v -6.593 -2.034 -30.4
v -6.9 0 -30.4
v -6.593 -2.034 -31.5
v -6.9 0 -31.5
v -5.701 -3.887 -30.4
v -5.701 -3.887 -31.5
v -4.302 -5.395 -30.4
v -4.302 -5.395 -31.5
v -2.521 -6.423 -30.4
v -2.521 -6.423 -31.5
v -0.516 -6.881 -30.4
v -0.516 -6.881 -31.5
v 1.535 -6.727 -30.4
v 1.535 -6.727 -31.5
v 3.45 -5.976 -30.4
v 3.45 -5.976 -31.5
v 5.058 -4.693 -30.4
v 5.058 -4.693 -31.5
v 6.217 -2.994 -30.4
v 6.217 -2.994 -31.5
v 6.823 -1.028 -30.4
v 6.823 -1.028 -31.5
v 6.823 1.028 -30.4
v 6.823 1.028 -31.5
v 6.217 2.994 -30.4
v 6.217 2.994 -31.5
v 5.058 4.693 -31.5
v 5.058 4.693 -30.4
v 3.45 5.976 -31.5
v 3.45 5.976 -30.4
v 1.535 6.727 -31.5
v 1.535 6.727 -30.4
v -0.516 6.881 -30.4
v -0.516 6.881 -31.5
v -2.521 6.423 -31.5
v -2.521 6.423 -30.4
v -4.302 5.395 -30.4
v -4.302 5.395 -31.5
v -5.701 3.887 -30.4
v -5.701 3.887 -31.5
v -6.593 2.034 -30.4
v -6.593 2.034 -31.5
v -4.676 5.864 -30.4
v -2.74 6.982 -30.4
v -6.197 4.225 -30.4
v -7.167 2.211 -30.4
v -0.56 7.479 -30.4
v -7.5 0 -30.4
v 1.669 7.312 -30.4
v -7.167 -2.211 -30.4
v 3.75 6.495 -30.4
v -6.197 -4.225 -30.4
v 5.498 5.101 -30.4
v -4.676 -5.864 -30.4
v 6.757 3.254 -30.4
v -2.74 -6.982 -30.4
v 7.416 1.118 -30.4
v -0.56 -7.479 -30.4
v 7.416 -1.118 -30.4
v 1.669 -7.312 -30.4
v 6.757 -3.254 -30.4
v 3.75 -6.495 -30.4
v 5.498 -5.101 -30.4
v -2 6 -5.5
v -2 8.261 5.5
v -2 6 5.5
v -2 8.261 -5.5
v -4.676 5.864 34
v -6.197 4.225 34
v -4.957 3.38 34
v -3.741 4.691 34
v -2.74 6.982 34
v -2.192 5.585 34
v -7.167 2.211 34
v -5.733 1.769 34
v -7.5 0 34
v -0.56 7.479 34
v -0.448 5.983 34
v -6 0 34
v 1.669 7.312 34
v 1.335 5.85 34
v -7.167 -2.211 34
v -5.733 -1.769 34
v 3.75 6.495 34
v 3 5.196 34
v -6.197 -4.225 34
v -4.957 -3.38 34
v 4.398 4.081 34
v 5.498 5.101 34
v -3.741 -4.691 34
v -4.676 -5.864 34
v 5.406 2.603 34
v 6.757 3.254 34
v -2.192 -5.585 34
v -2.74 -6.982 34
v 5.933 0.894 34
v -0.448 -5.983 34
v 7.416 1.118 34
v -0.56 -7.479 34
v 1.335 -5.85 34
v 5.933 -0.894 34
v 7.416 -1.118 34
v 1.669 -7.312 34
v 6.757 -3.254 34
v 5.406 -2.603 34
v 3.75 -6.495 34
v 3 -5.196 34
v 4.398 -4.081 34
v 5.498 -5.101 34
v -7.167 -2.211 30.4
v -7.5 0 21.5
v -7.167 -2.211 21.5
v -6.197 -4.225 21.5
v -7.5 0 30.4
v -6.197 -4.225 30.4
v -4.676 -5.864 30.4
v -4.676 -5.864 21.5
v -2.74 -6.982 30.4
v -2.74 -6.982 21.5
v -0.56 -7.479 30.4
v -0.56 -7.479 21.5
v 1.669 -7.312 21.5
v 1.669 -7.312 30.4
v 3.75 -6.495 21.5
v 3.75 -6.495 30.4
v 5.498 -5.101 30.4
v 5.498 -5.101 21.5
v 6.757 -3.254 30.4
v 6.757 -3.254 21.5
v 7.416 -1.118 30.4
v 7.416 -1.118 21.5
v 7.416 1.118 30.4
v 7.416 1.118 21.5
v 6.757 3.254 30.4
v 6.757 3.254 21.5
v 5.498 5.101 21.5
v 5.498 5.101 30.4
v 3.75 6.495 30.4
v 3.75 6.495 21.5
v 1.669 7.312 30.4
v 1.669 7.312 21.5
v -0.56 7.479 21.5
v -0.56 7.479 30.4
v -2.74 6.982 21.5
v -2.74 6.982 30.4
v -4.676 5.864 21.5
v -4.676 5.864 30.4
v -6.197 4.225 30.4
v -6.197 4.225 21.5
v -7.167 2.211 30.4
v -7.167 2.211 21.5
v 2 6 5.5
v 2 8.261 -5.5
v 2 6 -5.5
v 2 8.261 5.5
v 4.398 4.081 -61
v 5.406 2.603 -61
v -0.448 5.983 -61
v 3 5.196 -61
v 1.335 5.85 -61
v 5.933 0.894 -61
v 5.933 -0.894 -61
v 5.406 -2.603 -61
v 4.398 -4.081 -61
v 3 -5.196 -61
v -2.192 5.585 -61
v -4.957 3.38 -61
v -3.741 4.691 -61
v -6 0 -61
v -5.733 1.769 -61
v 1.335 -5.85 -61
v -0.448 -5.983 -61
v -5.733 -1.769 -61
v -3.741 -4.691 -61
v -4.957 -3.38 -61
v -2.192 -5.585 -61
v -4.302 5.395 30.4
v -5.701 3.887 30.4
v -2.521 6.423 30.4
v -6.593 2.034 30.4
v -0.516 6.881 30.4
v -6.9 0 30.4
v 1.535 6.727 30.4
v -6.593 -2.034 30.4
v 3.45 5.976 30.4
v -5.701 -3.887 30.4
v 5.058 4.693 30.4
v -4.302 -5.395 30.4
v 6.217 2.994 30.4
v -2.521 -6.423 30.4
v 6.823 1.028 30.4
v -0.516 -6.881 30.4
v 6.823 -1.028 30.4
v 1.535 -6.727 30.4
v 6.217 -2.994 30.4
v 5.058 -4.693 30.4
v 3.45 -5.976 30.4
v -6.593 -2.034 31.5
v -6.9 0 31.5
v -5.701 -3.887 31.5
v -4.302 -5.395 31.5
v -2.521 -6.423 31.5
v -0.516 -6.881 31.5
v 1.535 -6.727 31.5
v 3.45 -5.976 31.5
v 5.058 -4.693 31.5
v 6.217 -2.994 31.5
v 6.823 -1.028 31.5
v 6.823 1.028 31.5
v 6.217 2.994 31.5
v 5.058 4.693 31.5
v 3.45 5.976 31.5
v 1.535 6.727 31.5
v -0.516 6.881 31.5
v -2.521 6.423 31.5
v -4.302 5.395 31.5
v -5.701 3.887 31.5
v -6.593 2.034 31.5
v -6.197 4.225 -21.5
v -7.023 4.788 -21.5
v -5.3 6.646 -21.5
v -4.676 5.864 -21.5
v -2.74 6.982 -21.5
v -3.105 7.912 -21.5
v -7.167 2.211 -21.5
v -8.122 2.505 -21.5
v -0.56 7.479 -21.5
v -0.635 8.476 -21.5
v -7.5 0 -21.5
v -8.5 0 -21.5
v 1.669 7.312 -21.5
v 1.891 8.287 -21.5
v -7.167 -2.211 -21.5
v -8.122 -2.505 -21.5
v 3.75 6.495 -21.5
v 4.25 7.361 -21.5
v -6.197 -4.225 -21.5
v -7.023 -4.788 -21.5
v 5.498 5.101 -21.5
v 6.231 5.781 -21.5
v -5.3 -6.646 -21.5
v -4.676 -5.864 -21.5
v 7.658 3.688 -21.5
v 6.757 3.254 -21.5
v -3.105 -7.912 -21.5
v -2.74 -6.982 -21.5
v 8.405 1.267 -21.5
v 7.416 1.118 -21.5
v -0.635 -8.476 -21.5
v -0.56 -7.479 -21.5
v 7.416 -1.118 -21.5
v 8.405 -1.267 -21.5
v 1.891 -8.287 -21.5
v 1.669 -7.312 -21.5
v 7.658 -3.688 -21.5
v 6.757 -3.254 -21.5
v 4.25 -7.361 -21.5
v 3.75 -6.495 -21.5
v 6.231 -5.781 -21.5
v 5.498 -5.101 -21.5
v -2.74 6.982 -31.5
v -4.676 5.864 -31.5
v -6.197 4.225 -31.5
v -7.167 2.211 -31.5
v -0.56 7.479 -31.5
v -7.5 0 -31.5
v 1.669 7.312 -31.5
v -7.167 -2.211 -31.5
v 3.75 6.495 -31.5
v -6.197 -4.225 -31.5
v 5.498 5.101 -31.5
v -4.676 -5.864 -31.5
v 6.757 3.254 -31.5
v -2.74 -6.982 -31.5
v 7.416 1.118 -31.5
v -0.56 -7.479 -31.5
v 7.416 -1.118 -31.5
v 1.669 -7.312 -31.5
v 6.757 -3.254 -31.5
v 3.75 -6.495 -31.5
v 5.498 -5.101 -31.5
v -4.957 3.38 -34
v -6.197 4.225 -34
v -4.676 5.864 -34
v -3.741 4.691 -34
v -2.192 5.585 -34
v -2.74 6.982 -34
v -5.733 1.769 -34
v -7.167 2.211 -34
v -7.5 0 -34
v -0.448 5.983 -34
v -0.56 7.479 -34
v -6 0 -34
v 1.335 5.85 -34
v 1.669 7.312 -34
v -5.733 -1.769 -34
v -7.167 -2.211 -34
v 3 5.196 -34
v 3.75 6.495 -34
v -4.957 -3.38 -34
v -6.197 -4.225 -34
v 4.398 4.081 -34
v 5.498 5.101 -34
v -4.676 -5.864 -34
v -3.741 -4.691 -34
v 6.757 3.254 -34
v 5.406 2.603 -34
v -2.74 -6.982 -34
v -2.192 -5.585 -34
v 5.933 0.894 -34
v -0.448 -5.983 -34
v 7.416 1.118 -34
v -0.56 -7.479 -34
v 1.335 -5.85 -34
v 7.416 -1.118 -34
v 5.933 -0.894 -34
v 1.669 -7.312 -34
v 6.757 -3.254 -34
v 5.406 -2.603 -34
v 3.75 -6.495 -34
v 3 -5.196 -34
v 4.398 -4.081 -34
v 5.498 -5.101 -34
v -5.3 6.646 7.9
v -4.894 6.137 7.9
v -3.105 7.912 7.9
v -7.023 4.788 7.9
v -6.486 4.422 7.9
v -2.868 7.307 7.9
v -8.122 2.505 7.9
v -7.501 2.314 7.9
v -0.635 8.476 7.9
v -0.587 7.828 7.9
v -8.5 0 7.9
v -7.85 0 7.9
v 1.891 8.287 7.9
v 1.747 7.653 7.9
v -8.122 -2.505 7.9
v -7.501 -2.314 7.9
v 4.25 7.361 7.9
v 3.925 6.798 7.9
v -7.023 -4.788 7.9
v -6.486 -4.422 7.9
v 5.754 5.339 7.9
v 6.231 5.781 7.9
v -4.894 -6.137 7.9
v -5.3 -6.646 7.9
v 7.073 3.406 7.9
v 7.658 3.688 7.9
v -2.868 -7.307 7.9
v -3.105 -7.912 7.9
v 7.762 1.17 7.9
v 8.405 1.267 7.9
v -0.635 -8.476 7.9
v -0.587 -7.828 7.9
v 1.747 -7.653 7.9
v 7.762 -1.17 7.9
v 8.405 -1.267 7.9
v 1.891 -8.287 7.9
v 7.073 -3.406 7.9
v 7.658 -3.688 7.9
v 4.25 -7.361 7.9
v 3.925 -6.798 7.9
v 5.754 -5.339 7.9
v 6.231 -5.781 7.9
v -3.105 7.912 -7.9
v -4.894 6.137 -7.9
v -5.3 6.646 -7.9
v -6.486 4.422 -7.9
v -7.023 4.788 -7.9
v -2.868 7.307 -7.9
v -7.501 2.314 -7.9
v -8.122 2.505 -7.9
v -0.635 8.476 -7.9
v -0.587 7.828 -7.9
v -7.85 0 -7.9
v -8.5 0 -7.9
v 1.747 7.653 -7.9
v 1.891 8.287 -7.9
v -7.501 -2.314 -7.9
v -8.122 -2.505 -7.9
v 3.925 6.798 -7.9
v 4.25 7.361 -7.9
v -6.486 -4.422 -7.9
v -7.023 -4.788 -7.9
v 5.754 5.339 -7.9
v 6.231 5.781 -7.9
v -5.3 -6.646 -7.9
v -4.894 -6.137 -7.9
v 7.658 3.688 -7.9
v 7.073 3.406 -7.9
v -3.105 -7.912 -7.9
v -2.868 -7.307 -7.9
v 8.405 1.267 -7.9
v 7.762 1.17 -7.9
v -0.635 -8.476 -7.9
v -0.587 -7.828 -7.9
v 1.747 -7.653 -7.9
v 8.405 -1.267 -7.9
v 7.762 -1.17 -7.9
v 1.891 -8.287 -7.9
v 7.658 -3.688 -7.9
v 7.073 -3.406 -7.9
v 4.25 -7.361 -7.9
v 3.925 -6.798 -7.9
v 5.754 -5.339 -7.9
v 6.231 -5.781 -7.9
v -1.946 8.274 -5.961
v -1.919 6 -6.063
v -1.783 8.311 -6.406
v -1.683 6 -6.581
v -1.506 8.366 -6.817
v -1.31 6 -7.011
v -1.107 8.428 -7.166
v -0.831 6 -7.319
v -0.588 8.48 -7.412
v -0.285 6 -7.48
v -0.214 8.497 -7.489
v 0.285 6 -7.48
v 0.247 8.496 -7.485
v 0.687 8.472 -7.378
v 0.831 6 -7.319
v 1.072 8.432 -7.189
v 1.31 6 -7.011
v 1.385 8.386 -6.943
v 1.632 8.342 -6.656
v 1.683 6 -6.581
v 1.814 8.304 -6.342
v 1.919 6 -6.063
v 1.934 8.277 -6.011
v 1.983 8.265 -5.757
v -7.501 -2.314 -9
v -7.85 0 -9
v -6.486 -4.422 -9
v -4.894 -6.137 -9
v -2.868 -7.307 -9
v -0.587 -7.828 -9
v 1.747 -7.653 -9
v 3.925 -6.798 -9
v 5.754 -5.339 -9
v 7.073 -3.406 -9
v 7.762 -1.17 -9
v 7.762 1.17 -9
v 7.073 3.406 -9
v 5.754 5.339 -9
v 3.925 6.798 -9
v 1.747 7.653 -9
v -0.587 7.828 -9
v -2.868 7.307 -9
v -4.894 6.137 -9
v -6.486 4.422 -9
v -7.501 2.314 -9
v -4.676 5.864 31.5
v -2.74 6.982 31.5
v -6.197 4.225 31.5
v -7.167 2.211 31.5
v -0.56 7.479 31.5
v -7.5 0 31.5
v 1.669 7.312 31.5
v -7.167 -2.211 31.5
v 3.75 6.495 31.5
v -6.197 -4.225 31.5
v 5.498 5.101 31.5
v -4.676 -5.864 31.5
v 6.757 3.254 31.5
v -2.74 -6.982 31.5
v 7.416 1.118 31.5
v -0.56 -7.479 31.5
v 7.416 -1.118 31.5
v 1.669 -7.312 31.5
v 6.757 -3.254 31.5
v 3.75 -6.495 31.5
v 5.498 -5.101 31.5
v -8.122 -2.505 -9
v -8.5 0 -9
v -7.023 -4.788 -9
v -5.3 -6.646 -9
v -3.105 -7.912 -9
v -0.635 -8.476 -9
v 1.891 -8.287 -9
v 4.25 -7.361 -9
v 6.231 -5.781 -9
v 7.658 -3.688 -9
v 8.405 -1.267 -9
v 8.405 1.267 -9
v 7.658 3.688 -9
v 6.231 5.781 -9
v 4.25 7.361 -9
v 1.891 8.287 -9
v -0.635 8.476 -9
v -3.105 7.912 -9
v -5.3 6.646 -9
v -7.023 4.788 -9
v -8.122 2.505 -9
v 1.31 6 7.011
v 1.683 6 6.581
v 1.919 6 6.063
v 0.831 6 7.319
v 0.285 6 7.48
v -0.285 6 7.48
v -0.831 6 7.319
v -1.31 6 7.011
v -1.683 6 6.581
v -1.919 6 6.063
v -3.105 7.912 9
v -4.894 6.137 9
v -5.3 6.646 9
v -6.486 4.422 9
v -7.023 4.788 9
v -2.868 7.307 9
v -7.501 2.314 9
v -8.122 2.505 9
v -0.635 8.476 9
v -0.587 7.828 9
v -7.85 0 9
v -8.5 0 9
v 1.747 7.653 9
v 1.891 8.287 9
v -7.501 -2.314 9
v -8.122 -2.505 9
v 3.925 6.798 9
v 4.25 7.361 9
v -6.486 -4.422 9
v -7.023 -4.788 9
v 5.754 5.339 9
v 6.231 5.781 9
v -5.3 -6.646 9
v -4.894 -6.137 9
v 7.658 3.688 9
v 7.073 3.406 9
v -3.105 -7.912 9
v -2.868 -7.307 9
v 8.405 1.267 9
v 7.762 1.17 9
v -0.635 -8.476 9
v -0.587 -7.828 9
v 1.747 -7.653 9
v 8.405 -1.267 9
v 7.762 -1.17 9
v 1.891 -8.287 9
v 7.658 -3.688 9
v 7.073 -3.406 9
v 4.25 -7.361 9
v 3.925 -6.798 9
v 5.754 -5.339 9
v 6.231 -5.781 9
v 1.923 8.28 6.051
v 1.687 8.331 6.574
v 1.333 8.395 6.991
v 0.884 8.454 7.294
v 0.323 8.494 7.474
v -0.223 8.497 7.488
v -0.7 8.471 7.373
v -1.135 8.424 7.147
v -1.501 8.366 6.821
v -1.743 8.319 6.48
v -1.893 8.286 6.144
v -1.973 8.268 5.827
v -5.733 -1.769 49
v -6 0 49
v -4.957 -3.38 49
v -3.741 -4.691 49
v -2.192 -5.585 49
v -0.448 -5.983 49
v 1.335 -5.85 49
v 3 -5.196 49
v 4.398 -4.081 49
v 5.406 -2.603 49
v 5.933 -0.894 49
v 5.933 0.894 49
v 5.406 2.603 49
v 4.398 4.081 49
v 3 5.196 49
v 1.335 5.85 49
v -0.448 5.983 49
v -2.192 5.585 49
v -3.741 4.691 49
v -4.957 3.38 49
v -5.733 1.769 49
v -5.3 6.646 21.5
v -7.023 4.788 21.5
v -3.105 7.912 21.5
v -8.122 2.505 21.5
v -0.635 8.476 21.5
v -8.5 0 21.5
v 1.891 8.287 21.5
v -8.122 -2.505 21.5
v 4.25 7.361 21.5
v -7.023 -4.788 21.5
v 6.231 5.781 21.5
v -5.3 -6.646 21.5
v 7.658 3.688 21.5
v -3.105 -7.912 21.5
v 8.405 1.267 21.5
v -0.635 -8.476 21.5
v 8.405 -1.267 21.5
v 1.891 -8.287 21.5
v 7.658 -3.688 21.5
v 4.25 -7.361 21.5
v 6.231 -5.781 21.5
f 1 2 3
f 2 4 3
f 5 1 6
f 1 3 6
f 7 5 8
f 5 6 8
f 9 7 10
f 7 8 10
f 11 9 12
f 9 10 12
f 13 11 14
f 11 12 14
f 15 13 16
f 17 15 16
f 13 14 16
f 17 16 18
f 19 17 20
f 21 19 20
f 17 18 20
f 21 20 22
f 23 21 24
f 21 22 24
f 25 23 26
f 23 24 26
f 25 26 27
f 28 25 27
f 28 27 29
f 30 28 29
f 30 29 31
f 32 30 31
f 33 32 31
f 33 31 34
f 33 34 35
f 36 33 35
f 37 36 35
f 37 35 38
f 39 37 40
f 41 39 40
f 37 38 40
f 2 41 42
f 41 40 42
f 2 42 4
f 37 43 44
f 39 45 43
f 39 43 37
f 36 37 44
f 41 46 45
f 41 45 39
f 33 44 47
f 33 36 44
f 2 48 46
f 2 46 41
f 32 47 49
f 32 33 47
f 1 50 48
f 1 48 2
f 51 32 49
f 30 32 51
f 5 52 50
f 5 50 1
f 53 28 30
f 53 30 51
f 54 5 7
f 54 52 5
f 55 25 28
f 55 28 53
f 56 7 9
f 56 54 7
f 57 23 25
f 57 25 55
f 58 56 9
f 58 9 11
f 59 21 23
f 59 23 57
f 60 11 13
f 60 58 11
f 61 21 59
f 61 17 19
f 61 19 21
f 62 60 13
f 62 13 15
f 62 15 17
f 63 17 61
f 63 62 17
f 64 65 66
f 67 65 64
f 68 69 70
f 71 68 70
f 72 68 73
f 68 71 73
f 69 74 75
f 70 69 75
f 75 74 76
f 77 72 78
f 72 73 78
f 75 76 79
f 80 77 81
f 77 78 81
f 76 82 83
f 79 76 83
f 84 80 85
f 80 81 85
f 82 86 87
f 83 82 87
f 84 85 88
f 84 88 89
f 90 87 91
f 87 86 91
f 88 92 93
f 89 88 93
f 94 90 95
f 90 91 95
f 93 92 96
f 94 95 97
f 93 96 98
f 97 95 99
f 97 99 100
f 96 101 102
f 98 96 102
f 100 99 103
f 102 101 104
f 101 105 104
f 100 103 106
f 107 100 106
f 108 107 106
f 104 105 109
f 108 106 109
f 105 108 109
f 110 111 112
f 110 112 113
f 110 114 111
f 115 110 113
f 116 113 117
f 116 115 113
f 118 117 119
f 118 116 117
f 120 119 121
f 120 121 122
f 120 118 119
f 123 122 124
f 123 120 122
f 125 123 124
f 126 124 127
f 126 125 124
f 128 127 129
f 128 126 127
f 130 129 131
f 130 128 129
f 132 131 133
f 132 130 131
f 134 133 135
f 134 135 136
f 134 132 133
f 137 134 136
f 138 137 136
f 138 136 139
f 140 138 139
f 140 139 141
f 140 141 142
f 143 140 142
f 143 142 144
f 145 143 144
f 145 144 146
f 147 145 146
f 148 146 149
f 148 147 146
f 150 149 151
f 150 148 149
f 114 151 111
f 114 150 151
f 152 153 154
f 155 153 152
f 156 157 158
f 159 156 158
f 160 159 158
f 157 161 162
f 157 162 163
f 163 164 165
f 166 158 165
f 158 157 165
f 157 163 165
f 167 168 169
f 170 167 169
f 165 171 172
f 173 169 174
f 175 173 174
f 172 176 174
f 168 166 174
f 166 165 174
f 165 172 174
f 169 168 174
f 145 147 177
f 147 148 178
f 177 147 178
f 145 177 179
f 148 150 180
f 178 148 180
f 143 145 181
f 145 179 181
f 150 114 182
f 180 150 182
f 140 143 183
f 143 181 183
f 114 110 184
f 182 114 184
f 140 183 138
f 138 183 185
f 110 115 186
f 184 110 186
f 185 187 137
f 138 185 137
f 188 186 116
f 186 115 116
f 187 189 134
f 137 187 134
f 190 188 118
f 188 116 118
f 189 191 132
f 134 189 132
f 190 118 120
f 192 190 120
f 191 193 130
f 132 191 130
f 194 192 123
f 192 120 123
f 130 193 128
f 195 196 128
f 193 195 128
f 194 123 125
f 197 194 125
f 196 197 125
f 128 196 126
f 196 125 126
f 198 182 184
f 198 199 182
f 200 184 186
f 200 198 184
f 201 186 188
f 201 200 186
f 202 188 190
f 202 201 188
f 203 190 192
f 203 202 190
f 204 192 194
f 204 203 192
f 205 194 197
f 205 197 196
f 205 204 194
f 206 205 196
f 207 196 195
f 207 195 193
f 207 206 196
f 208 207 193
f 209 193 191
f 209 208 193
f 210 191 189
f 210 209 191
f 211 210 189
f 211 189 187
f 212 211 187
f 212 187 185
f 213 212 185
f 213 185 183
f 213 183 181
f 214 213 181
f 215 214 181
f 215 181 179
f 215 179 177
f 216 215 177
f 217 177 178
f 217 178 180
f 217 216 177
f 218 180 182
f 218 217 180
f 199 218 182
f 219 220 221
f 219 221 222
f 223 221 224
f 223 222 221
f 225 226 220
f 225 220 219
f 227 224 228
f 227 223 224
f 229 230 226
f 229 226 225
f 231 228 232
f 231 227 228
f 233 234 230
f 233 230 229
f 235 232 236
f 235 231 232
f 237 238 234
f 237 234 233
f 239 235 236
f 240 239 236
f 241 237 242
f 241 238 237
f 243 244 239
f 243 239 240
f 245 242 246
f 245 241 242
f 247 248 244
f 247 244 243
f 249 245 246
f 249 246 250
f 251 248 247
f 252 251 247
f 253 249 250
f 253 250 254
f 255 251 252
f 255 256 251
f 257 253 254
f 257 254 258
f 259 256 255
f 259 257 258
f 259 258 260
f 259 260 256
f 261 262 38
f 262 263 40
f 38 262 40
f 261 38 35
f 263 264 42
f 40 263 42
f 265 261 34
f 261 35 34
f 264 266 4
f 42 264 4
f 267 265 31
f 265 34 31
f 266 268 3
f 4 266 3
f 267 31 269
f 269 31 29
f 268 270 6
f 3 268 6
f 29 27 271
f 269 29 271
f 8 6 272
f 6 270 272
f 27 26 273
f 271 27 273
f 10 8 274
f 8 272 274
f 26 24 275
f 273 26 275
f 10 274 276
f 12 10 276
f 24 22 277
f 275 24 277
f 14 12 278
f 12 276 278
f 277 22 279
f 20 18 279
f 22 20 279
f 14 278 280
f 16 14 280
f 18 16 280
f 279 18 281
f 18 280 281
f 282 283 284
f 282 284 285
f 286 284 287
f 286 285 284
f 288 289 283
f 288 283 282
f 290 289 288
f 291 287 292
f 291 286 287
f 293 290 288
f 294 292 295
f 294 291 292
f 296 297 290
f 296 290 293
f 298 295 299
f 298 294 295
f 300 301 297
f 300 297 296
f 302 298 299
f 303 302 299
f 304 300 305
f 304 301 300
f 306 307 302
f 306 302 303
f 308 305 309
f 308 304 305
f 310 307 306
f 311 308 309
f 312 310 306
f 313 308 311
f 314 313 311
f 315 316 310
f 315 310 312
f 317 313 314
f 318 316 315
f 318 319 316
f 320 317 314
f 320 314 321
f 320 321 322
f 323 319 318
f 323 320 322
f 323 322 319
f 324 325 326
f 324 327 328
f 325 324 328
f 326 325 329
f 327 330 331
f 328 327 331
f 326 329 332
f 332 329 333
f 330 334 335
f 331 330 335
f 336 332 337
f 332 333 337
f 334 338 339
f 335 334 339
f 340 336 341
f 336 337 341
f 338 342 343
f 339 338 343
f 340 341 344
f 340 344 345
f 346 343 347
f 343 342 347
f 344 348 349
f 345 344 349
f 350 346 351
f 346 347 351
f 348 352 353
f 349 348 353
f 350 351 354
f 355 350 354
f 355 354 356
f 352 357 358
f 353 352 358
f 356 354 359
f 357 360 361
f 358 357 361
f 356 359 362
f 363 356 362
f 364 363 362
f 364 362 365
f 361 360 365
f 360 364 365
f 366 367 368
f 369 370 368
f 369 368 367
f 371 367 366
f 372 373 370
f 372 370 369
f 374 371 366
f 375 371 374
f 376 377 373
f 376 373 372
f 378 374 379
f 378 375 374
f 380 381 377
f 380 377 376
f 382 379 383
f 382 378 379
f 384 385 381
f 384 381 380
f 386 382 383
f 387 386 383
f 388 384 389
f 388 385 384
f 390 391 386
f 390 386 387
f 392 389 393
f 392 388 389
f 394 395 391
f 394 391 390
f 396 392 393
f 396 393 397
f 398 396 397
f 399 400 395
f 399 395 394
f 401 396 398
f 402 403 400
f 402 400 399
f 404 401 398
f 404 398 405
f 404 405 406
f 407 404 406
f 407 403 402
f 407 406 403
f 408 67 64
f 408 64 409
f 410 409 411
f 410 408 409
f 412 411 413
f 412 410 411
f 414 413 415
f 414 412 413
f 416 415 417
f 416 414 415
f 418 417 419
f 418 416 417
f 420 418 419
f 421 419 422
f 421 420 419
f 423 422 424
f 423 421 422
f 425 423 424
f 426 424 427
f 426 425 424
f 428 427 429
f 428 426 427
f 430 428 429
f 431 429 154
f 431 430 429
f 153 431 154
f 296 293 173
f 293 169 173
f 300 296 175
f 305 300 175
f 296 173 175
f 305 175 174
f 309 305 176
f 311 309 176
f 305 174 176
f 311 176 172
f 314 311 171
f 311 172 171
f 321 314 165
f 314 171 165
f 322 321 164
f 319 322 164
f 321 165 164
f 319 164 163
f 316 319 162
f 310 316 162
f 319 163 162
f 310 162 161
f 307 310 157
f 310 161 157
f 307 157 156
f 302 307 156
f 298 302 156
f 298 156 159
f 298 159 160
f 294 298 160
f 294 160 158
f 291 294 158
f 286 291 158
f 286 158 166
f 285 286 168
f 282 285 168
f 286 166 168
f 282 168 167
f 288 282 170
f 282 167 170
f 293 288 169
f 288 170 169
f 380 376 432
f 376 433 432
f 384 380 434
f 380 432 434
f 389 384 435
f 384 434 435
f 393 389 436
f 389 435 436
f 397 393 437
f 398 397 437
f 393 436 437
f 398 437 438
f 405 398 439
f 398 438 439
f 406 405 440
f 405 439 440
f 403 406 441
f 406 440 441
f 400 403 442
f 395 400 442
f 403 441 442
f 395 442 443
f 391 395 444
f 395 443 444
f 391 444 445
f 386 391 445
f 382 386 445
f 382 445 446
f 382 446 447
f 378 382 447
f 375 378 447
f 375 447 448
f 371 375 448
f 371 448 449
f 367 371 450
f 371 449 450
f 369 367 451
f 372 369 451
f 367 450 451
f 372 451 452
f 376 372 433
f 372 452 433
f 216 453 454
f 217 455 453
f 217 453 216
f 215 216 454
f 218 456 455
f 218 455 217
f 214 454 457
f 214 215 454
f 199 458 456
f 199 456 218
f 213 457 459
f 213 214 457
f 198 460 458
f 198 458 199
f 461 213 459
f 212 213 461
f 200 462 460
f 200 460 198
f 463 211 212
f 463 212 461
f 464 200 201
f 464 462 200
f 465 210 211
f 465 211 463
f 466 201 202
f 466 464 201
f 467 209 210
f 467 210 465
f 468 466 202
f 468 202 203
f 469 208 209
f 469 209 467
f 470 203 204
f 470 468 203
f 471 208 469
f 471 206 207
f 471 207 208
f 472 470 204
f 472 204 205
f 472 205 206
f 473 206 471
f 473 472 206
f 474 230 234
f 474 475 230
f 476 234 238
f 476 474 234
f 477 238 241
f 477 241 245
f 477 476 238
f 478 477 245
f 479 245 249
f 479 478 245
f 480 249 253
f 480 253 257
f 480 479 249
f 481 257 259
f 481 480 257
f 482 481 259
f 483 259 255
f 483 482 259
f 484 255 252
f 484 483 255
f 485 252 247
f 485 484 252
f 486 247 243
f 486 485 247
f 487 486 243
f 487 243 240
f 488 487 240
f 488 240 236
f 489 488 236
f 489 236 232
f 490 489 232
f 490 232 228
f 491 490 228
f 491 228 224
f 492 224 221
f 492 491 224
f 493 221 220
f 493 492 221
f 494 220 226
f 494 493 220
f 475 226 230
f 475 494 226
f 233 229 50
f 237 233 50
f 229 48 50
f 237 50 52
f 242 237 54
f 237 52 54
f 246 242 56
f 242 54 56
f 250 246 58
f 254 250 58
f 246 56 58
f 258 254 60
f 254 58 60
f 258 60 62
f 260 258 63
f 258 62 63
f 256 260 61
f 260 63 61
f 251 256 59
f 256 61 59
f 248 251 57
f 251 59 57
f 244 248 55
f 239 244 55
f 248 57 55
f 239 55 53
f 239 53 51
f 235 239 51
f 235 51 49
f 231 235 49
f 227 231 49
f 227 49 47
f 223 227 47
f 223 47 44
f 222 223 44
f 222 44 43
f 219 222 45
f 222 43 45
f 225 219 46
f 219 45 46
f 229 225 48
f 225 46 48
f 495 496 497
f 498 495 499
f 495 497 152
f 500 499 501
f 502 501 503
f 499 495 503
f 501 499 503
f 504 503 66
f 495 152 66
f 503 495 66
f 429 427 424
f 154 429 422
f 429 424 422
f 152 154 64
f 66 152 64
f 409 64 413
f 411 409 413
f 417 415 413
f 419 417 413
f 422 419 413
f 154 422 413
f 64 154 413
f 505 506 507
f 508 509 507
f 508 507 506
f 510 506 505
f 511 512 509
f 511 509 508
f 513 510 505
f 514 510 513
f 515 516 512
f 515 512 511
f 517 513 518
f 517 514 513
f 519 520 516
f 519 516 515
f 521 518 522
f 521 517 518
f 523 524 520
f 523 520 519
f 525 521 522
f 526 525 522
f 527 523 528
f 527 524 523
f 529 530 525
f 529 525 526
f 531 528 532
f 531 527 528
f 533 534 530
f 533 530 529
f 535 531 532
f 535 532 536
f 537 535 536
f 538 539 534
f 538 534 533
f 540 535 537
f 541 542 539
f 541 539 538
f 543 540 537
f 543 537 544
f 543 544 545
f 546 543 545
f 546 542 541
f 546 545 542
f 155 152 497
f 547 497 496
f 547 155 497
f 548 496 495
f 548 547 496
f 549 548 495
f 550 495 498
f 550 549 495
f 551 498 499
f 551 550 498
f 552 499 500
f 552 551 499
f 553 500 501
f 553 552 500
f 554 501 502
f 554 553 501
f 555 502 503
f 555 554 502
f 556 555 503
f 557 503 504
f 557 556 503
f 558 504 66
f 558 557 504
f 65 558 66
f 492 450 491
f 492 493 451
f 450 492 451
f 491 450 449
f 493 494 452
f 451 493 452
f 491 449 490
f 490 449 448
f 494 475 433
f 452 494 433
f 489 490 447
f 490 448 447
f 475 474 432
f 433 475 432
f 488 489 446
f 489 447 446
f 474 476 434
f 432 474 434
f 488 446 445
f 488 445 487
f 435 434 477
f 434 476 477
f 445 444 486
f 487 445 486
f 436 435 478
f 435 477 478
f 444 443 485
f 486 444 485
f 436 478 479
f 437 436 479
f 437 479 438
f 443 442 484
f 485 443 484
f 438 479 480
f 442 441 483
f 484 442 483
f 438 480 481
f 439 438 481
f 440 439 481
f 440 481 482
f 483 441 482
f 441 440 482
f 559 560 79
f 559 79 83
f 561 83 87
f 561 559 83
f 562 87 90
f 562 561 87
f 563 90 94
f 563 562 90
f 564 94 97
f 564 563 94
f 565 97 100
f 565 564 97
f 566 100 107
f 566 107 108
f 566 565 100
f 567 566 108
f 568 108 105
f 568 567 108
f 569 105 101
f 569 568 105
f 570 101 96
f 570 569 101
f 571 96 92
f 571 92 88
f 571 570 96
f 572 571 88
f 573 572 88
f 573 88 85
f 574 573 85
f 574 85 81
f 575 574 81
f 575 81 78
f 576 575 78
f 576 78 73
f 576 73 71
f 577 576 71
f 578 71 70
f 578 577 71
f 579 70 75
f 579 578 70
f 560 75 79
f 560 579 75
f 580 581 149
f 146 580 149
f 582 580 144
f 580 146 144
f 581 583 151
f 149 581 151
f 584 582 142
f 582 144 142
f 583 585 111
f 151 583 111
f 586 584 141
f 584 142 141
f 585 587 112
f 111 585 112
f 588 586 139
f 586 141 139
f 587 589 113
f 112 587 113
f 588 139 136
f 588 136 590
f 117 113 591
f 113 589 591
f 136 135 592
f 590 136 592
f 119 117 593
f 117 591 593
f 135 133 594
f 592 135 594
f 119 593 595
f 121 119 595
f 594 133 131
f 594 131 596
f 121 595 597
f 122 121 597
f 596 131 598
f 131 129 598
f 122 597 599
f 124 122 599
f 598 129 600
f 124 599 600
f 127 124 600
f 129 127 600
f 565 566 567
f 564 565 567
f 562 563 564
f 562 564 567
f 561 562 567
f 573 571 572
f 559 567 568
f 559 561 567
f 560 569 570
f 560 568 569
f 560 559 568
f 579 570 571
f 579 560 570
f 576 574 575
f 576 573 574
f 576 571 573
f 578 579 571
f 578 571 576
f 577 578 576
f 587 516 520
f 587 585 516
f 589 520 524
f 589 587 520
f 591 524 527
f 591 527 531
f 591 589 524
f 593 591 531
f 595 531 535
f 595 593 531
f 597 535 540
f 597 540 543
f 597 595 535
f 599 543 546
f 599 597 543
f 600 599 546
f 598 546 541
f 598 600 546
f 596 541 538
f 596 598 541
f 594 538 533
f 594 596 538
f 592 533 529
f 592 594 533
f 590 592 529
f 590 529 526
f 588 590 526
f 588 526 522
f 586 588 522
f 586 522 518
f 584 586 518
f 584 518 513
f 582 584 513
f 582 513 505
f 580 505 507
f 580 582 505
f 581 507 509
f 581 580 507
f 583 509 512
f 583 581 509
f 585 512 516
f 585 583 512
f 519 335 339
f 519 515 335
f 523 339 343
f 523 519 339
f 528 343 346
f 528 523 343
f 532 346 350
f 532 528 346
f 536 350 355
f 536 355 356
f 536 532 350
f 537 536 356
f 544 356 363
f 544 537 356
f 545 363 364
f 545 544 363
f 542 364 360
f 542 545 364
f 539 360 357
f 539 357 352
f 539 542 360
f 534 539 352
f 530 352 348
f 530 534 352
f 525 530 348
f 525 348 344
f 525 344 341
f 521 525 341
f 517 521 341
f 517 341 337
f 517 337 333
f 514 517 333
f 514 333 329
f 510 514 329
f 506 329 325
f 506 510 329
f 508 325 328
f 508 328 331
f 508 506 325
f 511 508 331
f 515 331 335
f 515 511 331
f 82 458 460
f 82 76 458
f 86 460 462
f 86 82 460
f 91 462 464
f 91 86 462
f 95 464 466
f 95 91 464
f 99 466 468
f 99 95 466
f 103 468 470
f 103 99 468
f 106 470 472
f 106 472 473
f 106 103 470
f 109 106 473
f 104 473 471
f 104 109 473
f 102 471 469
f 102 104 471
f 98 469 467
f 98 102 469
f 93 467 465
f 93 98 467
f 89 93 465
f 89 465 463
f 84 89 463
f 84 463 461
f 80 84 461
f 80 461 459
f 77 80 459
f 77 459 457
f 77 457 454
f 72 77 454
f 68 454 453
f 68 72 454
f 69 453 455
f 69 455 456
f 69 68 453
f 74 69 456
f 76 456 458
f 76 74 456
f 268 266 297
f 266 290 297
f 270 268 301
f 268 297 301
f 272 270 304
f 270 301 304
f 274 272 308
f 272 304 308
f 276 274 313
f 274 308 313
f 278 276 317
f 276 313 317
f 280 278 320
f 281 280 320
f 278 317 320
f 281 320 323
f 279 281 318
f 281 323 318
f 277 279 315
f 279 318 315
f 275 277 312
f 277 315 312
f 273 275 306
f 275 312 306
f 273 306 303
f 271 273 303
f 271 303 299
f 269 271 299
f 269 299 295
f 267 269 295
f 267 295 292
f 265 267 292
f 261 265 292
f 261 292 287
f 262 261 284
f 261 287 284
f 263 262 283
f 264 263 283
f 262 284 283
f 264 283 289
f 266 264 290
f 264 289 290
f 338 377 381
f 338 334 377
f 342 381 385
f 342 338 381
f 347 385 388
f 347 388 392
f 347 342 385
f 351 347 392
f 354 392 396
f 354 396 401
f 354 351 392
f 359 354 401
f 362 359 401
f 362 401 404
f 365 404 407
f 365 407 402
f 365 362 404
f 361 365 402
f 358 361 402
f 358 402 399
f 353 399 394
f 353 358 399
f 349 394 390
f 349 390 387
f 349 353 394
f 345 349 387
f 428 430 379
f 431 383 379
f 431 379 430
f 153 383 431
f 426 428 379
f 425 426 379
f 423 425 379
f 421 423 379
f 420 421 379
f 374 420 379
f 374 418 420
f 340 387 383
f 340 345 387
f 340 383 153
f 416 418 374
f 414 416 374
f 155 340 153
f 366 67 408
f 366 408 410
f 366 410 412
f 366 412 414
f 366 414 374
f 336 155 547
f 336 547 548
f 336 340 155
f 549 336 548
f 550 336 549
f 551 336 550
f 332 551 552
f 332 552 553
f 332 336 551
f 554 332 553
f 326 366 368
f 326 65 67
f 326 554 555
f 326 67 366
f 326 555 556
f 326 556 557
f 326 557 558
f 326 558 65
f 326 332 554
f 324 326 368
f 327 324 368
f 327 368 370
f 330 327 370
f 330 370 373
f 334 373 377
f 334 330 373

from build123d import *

# Parameters (mm, degrees)
SKETCH1_R               = 8.5
BOSS_EXTRUDE1_DEPTH     = 61
SKETCH2_W               = 39.5
SKETCH2_H               = 1
SKETCH3_W               = 27
SKETCH3_H               = 1.5
SKETCH4_W               = 1.1
SKETCH4_H               = 0.6
SKETCH5_W               = 1.1
SKETCH5_H               = 0.65
CUT_EXTRUDE1_DEPTH      = 63.173145328
CUT_EXTRUDE1_DEPTH_BACK = 63.173145328
SKETCH6_W               = 12
SKETCH6_H               = 12
CUT_EXTRUDE2_DEPTH      = 2.5


with BuildPart() as part:
    # Sketch1 → Boss-Extrude1 (new, symmetric)
    with BuildSketch(Plane.XY):
        with Locations(Location((0, 0, 0), (0, 0, 180))):
            Circle(SKETCH1_R)
    extrude(amount=BOSS_EXTRUDE1_DEPTH, both=True)

    # Sketch2 → Cut-Revolve1 (revolve, cut)
    with BuildSketch(Plane(origin=(0, 0, 0), x_dir=(0, 0, -1), z_dir=(1, 0, 0)), mode=Mode.PRIVATE) as cut_revolve1_sk:
        with Locations((41.25, 8)):
            Rectangle(SKETCH2_W, SKETCH2_H)
    cut_revolve1 = revolve(cut_revolve1_sk.sketch.rotate(Axis((0, 0, -67.1), (0, 0, 1)), 90), axis=Axis((0, 0, -67.1), (0, 0, 1)), mode=Mode.SUBTRACT)

    # Mirror1: Cut-Revolve1 across plane
    add(cut_revolve1.mirror(Plane.XY), mode=Mode.SUBTRACT)

    # Sketch3 → Cut-Revolve2 (revolve, cut)
    with BuildSketch(Plane(origin=(0, 0, 0), x_dir=(0, 0, -1), z_dir=(1, 0, 0)), mode=Mode.PRIVATE) as cut_revolve2_sk:
        with Locations((47.5, 6.75)):
            Rectangle(SKETCH3_W, SKETCH3_H)
    cut_revolve2 = revolve(cut_revolve2_sk.sketch.rotate(Axis((0, 0, -67.1), (0, 0, 1)), 90), axis=Axis((0, 0, -67.1), (0, 0, 1)), mode=Mode.SUBTRACT)

    # Mirror2: Cut-Revolve2 across plane
    add(cut_revolve2.mirror(Plane.XY), mode=Mode.SUBTRACT)

    # Sketch4 → Cut-Revolve3 (revolve, cut)
    with BuildSketch(Plane(origin=(0, 0, 0), x_dir=(0, 0, -1), z_dir=(1, 0, 0)), mode=Mode.PRIVATE) as cut_revolve3_sk:
        with Locations((30.95, 7.2)):
            Rectangle(SKETCH4_W, SKETCH4_H)
    cut_revolve3 = revolve(cut_revolve3_sk.sketch.rotate(Axis((0, 0, -67.1), (0, 0, 1)), 90), axis=Axis((0, 0, -67.1), (0, 0, 1)), mode=Mode.SUBTRACT)

    # Mirror3: Cut-Revolve3 across plane
    add(cut_revolve3.mirror(Plane.XY), mode=Mode.SUBTRACT)

    # Sketch5 → Cut-Revolve4 (revolve, cut)
    with BuildSketch(Plane(origin=(0, 0, 0), x_dir=(0, 0, -1), z_dir=(1, 0, 0)), mode=Mode.PRIVATE) as cut_revolve4_sk:
        with Locations((8.45, 8.175)):
            Rectangle(SKETCH5_W, SKETCH5_H)
    cut_revolve4 = revolve(cut_revolve4_sk.sketch.rotate(Axis((0, 0, -67.1), (0, 0, 1)), 90), axis=Axis((0, 0, -67.1), (0, 0, 1)), mode=Mode.SUBTRACT)

    # Mirror4: Cut-Revolve4 across plane
    add(cut_revolve4.mirror(Plane.XY), mode=Mode.SUBTRACT)

    # Sketch6 → Cut-Extrude1 (cut, two sides: drawn at the far end of the back side and taken through both)
    with BuildSketch(Plane(origin=(0, 0, 0), x_dir=(0, 0, -1), z_dir=(1, 0, 0)).offset(-CUT_EXTRUDE1_DEPTH_BACK)):
        with Locations((-55, 0)):
            Rectangle(SKETCH6_W, SKETCH6_H)
    extrude(amount=CUT_EXTRUDE1_DEPTH + CUT_EXTRUDE1_DEPTH_BACK, mode=Mode.SUBTRACT)

    # Sketch8 → Cut-Extrude2 (cut)
    with BuildSketch(Plane(origin=(0, 8.5, 0), x_dir=(1, 0, 0), z_dir=(0, 1, 0))):
        with BuildLine():
            Line((-2, -5.5), (-2, 5.5))
            ThreePointArc((-2, 5.5), (0, 7.5), (2, 5.5))
            Line((2, 5.5), (2, -5.5))
            ThreePointArc((2, -5.5), (0, -7.5), (-2, -5.5))
        make_face()
    extrude(amount=-CUT_EXTRUDE2_DEPTH, mode=Mode.SUBTRACT)


solid = part.part
